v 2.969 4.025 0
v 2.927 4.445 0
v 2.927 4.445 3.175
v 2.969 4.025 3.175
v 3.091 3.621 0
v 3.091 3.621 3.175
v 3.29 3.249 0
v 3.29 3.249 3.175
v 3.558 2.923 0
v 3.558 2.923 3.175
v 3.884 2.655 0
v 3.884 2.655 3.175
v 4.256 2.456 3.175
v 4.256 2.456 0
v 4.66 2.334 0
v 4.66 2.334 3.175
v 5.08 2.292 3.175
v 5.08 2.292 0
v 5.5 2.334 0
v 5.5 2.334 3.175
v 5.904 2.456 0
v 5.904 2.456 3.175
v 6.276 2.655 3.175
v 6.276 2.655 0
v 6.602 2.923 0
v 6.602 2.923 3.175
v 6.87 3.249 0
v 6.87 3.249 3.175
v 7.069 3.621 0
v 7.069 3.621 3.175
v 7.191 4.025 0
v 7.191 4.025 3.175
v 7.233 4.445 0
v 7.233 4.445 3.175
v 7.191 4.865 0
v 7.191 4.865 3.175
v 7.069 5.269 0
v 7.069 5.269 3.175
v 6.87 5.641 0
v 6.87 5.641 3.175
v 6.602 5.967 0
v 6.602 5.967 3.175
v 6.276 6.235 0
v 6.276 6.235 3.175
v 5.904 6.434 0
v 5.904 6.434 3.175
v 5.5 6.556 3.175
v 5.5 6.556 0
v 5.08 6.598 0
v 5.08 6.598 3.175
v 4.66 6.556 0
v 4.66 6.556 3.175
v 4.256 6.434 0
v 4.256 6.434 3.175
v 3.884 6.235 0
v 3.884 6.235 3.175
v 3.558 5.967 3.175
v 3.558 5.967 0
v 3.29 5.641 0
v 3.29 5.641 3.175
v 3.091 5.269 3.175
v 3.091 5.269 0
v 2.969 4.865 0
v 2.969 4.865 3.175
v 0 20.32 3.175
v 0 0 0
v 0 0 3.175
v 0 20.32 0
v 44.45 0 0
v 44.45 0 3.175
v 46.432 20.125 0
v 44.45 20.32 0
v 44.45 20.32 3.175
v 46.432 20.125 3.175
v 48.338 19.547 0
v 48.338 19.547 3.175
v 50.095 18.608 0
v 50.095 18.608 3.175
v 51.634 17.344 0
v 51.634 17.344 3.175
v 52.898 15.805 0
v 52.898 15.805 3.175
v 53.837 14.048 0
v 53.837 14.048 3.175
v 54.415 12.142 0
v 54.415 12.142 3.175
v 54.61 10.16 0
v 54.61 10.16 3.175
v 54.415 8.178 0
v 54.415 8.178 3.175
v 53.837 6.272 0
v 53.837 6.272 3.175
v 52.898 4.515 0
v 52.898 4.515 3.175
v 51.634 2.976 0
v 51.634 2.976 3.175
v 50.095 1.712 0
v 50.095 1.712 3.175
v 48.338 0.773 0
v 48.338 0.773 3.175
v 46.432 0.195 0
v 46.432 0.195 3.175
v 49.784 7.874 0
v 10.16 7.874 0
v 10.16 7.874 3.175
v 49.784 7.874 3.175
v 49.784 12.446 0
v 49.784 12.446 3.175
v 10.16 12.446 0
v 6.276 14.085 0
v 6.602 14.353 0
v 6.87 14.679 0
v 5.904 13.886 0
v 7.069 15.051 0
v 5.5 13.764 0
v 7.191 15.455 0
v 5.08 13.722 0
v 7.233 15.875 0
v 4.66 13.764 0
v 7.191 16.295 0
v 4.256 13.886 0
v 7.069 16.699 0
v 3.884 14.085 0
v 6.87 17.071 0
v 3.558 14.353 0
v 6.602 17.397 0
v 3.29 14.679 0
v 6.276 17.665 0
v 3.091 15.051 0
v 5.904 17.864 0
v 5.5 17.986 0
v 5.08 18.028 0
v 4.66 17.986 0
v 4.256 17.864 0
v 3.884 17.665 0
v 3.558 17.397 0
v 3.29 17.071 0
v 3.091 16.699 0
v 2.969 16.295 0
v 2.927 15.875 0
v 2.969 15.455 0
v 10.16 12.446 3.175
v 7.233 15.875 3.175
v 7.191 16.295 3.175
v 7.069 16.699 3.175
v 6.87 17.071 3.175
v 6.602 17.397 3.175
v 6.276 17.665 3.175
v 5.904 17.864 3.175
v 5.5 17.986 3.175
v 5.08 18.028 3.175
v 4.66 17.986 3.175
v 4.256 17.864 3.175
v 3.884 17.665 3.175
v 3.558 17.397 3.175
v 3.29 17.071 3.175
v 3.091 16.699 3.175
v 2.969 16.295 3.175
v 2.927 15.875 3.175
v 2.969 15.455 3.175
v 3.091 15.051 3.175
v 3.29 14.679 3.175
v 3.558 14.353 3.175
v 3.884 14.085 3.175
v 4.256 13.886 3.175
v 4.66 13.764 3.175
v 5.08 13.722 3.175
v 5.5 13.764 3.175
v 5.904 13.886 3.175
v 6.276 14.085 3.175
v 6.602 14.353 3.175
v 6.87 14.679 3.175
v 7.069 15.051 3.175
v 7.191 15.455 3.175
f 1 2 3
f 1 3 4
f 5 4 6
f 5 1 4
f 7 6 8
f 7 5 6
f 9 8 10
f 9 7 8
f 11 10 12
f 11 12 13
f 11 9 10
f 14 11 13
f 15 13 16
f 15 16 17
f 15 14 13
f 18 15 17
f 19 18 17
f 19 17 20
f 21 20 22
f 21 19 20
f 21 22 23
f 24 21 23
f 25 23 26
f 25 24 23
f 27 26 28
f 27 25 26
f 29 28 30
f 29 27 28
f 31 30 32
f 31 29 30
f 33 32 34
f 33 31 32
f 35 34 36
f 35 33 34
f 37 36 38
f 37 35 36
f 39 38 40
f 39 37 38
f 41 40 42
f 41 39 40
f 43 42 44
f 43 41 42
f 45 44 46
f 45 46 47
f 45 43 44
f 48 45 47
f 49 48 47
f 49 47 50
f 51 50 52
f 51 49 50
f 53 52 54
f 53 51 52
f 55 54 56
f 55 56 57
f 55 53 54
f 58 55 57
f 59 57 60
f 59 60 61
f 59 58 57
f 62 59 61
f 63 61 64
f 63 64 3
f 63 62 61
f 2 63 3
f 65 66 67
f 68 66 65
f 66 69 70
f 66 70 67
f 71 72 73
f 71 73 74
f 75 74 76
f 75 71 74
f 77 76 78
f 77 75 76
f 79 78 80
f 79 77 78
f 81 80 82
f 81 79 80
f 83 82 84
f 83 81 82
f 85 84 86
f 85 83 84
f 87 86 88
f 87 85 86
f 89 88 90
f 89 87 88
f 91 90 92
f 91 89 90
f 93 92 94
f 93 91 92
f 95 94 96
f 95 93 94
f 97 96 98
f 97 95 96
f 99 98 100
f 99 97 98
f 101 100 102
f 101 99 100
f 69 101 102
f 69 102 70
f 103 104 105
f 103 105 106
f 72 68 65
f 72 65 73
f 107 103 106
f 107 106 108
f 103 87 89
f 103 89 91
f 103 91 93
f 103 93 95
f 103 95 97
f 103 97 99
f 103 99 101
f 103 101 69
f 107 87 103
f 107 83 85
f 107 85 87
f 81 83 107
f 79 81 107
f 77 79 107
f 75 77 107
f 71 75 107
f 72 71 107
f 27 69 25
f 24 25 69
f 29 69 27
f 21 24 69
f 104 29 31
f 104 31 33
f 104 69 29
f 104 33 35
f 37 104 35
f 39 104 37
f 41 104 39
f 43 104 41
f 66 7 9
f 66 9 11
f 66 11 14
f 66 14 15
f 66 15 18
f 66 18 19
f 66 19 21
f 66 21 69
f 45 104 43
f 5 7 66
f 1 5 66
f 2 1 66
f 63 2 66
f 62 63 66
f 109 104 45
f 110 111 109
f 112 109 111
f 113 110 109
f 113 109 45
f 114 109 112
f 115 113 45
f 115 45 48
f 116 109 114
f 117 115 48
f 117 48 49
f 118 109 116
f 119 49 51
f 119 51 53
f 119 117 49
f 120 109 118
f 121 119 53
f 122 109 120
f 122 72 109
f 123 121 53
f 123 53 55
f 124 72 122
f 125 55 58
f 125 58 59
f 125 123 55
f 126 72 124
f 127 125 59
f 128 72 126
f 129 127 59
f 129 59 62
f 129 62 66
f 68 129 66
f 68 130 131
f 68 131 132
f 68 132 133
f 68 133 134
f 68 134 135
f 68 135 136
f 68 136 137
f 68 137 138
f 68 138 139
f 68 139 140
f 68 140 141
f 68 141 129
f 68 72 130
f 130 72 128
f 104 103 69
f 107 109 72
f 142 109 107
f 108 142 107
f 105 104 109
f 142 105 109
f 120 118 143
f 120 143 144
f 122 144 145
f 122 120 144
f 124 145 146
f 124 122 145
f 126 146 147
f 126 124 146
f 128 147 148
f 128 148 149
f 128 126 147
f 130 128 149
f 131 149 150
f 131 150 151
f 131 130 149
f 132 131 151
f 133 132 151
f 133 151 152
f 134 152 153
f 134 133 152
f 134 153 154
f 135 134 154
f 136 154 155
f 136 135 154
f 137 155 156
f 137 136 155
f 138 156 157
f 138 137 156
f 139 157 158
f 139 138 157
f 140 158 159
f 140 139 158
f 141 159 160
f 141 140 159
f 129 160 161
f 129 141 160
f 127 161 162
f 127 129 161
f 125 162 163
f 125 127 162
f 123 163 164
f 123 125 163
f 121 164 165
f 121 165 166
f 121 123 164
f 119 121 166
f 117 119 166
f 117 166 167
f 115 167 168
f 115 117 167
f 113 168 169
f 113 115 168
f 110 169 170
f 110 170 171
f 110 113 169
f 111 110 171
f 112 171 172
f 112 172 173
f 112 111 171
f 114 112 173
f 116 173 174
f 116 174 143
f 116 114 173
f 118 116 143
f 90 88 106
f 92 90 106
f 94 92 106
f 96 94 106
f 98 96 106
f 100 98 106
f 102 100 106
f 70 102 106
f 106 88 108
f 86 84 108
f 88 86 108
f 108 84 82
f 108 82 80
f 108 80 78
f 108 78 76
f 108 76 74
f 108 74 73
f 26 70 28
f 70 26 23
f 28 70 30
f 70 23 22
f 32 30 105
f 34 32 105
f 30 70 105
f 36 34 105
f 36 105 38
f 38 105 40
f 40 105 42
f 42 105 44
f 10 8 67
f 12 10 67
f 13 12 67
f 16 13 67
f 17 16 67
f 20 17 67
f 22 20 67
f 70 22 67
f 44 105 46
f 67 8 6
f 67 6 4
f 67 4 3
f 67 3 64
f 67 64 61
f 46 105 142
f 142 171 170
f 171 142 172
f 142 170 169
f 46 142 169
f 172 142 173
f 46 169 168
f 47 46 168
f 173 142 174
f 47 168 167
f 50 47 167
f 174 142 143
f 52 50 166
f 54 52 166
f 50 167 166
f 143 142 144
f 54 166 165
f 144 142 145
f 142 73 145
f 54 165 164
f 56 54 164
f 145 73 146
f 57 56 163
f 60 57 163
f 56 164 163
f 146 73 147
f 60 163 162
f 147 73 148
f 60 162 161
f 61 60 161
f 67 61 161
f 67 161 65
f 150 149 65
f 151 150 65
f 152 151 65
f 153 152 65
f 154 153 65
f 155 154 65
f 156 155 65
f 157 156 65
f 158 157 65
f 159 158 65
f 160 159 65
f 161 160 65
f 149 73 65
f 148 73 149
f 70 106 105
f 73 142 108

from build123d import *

# Parameters (mm, degrees)
SKETCH1_R           = 2.15265
SKETCH1_W           = 39.624
SKETCH1_H           = 4.572
BOSS_EXTRUDE1_DEPTH = 3.175


with BuildPart() as part:
    # Sketch1 → Boss-Extrude1 (new body)
    with BuildSketch(Plane.XY):
        with BuildLine():
            Line((0, 0), (0, 20.32))
            Line((0, 20.32), (44.45, 20.32))
            ThreePointArc((44.45, 20.32), (54.61, 10.16), (44.45, 0))
            Line((44.45, 0), (0, 0))
        make_face()
        with Locations((5.08, 15.875)):
            Circle(SKETCH1_R, mode=Mode.SUBTRACT)
        with Locations(Location((5.08, 4.445, 0), (0, 0, 180))):
            Circle(SKETCH1_R, mode=Mode.SUBTRACT)
        with Locations((29.972, 10.16)):
            Rectangle(SKETCH1_W, SKETCH1_H, mode=Mode.SUBTRACT)
    extrude(amount=BOSS_EXTRUDE1_DEPTH)


solid = part.part
